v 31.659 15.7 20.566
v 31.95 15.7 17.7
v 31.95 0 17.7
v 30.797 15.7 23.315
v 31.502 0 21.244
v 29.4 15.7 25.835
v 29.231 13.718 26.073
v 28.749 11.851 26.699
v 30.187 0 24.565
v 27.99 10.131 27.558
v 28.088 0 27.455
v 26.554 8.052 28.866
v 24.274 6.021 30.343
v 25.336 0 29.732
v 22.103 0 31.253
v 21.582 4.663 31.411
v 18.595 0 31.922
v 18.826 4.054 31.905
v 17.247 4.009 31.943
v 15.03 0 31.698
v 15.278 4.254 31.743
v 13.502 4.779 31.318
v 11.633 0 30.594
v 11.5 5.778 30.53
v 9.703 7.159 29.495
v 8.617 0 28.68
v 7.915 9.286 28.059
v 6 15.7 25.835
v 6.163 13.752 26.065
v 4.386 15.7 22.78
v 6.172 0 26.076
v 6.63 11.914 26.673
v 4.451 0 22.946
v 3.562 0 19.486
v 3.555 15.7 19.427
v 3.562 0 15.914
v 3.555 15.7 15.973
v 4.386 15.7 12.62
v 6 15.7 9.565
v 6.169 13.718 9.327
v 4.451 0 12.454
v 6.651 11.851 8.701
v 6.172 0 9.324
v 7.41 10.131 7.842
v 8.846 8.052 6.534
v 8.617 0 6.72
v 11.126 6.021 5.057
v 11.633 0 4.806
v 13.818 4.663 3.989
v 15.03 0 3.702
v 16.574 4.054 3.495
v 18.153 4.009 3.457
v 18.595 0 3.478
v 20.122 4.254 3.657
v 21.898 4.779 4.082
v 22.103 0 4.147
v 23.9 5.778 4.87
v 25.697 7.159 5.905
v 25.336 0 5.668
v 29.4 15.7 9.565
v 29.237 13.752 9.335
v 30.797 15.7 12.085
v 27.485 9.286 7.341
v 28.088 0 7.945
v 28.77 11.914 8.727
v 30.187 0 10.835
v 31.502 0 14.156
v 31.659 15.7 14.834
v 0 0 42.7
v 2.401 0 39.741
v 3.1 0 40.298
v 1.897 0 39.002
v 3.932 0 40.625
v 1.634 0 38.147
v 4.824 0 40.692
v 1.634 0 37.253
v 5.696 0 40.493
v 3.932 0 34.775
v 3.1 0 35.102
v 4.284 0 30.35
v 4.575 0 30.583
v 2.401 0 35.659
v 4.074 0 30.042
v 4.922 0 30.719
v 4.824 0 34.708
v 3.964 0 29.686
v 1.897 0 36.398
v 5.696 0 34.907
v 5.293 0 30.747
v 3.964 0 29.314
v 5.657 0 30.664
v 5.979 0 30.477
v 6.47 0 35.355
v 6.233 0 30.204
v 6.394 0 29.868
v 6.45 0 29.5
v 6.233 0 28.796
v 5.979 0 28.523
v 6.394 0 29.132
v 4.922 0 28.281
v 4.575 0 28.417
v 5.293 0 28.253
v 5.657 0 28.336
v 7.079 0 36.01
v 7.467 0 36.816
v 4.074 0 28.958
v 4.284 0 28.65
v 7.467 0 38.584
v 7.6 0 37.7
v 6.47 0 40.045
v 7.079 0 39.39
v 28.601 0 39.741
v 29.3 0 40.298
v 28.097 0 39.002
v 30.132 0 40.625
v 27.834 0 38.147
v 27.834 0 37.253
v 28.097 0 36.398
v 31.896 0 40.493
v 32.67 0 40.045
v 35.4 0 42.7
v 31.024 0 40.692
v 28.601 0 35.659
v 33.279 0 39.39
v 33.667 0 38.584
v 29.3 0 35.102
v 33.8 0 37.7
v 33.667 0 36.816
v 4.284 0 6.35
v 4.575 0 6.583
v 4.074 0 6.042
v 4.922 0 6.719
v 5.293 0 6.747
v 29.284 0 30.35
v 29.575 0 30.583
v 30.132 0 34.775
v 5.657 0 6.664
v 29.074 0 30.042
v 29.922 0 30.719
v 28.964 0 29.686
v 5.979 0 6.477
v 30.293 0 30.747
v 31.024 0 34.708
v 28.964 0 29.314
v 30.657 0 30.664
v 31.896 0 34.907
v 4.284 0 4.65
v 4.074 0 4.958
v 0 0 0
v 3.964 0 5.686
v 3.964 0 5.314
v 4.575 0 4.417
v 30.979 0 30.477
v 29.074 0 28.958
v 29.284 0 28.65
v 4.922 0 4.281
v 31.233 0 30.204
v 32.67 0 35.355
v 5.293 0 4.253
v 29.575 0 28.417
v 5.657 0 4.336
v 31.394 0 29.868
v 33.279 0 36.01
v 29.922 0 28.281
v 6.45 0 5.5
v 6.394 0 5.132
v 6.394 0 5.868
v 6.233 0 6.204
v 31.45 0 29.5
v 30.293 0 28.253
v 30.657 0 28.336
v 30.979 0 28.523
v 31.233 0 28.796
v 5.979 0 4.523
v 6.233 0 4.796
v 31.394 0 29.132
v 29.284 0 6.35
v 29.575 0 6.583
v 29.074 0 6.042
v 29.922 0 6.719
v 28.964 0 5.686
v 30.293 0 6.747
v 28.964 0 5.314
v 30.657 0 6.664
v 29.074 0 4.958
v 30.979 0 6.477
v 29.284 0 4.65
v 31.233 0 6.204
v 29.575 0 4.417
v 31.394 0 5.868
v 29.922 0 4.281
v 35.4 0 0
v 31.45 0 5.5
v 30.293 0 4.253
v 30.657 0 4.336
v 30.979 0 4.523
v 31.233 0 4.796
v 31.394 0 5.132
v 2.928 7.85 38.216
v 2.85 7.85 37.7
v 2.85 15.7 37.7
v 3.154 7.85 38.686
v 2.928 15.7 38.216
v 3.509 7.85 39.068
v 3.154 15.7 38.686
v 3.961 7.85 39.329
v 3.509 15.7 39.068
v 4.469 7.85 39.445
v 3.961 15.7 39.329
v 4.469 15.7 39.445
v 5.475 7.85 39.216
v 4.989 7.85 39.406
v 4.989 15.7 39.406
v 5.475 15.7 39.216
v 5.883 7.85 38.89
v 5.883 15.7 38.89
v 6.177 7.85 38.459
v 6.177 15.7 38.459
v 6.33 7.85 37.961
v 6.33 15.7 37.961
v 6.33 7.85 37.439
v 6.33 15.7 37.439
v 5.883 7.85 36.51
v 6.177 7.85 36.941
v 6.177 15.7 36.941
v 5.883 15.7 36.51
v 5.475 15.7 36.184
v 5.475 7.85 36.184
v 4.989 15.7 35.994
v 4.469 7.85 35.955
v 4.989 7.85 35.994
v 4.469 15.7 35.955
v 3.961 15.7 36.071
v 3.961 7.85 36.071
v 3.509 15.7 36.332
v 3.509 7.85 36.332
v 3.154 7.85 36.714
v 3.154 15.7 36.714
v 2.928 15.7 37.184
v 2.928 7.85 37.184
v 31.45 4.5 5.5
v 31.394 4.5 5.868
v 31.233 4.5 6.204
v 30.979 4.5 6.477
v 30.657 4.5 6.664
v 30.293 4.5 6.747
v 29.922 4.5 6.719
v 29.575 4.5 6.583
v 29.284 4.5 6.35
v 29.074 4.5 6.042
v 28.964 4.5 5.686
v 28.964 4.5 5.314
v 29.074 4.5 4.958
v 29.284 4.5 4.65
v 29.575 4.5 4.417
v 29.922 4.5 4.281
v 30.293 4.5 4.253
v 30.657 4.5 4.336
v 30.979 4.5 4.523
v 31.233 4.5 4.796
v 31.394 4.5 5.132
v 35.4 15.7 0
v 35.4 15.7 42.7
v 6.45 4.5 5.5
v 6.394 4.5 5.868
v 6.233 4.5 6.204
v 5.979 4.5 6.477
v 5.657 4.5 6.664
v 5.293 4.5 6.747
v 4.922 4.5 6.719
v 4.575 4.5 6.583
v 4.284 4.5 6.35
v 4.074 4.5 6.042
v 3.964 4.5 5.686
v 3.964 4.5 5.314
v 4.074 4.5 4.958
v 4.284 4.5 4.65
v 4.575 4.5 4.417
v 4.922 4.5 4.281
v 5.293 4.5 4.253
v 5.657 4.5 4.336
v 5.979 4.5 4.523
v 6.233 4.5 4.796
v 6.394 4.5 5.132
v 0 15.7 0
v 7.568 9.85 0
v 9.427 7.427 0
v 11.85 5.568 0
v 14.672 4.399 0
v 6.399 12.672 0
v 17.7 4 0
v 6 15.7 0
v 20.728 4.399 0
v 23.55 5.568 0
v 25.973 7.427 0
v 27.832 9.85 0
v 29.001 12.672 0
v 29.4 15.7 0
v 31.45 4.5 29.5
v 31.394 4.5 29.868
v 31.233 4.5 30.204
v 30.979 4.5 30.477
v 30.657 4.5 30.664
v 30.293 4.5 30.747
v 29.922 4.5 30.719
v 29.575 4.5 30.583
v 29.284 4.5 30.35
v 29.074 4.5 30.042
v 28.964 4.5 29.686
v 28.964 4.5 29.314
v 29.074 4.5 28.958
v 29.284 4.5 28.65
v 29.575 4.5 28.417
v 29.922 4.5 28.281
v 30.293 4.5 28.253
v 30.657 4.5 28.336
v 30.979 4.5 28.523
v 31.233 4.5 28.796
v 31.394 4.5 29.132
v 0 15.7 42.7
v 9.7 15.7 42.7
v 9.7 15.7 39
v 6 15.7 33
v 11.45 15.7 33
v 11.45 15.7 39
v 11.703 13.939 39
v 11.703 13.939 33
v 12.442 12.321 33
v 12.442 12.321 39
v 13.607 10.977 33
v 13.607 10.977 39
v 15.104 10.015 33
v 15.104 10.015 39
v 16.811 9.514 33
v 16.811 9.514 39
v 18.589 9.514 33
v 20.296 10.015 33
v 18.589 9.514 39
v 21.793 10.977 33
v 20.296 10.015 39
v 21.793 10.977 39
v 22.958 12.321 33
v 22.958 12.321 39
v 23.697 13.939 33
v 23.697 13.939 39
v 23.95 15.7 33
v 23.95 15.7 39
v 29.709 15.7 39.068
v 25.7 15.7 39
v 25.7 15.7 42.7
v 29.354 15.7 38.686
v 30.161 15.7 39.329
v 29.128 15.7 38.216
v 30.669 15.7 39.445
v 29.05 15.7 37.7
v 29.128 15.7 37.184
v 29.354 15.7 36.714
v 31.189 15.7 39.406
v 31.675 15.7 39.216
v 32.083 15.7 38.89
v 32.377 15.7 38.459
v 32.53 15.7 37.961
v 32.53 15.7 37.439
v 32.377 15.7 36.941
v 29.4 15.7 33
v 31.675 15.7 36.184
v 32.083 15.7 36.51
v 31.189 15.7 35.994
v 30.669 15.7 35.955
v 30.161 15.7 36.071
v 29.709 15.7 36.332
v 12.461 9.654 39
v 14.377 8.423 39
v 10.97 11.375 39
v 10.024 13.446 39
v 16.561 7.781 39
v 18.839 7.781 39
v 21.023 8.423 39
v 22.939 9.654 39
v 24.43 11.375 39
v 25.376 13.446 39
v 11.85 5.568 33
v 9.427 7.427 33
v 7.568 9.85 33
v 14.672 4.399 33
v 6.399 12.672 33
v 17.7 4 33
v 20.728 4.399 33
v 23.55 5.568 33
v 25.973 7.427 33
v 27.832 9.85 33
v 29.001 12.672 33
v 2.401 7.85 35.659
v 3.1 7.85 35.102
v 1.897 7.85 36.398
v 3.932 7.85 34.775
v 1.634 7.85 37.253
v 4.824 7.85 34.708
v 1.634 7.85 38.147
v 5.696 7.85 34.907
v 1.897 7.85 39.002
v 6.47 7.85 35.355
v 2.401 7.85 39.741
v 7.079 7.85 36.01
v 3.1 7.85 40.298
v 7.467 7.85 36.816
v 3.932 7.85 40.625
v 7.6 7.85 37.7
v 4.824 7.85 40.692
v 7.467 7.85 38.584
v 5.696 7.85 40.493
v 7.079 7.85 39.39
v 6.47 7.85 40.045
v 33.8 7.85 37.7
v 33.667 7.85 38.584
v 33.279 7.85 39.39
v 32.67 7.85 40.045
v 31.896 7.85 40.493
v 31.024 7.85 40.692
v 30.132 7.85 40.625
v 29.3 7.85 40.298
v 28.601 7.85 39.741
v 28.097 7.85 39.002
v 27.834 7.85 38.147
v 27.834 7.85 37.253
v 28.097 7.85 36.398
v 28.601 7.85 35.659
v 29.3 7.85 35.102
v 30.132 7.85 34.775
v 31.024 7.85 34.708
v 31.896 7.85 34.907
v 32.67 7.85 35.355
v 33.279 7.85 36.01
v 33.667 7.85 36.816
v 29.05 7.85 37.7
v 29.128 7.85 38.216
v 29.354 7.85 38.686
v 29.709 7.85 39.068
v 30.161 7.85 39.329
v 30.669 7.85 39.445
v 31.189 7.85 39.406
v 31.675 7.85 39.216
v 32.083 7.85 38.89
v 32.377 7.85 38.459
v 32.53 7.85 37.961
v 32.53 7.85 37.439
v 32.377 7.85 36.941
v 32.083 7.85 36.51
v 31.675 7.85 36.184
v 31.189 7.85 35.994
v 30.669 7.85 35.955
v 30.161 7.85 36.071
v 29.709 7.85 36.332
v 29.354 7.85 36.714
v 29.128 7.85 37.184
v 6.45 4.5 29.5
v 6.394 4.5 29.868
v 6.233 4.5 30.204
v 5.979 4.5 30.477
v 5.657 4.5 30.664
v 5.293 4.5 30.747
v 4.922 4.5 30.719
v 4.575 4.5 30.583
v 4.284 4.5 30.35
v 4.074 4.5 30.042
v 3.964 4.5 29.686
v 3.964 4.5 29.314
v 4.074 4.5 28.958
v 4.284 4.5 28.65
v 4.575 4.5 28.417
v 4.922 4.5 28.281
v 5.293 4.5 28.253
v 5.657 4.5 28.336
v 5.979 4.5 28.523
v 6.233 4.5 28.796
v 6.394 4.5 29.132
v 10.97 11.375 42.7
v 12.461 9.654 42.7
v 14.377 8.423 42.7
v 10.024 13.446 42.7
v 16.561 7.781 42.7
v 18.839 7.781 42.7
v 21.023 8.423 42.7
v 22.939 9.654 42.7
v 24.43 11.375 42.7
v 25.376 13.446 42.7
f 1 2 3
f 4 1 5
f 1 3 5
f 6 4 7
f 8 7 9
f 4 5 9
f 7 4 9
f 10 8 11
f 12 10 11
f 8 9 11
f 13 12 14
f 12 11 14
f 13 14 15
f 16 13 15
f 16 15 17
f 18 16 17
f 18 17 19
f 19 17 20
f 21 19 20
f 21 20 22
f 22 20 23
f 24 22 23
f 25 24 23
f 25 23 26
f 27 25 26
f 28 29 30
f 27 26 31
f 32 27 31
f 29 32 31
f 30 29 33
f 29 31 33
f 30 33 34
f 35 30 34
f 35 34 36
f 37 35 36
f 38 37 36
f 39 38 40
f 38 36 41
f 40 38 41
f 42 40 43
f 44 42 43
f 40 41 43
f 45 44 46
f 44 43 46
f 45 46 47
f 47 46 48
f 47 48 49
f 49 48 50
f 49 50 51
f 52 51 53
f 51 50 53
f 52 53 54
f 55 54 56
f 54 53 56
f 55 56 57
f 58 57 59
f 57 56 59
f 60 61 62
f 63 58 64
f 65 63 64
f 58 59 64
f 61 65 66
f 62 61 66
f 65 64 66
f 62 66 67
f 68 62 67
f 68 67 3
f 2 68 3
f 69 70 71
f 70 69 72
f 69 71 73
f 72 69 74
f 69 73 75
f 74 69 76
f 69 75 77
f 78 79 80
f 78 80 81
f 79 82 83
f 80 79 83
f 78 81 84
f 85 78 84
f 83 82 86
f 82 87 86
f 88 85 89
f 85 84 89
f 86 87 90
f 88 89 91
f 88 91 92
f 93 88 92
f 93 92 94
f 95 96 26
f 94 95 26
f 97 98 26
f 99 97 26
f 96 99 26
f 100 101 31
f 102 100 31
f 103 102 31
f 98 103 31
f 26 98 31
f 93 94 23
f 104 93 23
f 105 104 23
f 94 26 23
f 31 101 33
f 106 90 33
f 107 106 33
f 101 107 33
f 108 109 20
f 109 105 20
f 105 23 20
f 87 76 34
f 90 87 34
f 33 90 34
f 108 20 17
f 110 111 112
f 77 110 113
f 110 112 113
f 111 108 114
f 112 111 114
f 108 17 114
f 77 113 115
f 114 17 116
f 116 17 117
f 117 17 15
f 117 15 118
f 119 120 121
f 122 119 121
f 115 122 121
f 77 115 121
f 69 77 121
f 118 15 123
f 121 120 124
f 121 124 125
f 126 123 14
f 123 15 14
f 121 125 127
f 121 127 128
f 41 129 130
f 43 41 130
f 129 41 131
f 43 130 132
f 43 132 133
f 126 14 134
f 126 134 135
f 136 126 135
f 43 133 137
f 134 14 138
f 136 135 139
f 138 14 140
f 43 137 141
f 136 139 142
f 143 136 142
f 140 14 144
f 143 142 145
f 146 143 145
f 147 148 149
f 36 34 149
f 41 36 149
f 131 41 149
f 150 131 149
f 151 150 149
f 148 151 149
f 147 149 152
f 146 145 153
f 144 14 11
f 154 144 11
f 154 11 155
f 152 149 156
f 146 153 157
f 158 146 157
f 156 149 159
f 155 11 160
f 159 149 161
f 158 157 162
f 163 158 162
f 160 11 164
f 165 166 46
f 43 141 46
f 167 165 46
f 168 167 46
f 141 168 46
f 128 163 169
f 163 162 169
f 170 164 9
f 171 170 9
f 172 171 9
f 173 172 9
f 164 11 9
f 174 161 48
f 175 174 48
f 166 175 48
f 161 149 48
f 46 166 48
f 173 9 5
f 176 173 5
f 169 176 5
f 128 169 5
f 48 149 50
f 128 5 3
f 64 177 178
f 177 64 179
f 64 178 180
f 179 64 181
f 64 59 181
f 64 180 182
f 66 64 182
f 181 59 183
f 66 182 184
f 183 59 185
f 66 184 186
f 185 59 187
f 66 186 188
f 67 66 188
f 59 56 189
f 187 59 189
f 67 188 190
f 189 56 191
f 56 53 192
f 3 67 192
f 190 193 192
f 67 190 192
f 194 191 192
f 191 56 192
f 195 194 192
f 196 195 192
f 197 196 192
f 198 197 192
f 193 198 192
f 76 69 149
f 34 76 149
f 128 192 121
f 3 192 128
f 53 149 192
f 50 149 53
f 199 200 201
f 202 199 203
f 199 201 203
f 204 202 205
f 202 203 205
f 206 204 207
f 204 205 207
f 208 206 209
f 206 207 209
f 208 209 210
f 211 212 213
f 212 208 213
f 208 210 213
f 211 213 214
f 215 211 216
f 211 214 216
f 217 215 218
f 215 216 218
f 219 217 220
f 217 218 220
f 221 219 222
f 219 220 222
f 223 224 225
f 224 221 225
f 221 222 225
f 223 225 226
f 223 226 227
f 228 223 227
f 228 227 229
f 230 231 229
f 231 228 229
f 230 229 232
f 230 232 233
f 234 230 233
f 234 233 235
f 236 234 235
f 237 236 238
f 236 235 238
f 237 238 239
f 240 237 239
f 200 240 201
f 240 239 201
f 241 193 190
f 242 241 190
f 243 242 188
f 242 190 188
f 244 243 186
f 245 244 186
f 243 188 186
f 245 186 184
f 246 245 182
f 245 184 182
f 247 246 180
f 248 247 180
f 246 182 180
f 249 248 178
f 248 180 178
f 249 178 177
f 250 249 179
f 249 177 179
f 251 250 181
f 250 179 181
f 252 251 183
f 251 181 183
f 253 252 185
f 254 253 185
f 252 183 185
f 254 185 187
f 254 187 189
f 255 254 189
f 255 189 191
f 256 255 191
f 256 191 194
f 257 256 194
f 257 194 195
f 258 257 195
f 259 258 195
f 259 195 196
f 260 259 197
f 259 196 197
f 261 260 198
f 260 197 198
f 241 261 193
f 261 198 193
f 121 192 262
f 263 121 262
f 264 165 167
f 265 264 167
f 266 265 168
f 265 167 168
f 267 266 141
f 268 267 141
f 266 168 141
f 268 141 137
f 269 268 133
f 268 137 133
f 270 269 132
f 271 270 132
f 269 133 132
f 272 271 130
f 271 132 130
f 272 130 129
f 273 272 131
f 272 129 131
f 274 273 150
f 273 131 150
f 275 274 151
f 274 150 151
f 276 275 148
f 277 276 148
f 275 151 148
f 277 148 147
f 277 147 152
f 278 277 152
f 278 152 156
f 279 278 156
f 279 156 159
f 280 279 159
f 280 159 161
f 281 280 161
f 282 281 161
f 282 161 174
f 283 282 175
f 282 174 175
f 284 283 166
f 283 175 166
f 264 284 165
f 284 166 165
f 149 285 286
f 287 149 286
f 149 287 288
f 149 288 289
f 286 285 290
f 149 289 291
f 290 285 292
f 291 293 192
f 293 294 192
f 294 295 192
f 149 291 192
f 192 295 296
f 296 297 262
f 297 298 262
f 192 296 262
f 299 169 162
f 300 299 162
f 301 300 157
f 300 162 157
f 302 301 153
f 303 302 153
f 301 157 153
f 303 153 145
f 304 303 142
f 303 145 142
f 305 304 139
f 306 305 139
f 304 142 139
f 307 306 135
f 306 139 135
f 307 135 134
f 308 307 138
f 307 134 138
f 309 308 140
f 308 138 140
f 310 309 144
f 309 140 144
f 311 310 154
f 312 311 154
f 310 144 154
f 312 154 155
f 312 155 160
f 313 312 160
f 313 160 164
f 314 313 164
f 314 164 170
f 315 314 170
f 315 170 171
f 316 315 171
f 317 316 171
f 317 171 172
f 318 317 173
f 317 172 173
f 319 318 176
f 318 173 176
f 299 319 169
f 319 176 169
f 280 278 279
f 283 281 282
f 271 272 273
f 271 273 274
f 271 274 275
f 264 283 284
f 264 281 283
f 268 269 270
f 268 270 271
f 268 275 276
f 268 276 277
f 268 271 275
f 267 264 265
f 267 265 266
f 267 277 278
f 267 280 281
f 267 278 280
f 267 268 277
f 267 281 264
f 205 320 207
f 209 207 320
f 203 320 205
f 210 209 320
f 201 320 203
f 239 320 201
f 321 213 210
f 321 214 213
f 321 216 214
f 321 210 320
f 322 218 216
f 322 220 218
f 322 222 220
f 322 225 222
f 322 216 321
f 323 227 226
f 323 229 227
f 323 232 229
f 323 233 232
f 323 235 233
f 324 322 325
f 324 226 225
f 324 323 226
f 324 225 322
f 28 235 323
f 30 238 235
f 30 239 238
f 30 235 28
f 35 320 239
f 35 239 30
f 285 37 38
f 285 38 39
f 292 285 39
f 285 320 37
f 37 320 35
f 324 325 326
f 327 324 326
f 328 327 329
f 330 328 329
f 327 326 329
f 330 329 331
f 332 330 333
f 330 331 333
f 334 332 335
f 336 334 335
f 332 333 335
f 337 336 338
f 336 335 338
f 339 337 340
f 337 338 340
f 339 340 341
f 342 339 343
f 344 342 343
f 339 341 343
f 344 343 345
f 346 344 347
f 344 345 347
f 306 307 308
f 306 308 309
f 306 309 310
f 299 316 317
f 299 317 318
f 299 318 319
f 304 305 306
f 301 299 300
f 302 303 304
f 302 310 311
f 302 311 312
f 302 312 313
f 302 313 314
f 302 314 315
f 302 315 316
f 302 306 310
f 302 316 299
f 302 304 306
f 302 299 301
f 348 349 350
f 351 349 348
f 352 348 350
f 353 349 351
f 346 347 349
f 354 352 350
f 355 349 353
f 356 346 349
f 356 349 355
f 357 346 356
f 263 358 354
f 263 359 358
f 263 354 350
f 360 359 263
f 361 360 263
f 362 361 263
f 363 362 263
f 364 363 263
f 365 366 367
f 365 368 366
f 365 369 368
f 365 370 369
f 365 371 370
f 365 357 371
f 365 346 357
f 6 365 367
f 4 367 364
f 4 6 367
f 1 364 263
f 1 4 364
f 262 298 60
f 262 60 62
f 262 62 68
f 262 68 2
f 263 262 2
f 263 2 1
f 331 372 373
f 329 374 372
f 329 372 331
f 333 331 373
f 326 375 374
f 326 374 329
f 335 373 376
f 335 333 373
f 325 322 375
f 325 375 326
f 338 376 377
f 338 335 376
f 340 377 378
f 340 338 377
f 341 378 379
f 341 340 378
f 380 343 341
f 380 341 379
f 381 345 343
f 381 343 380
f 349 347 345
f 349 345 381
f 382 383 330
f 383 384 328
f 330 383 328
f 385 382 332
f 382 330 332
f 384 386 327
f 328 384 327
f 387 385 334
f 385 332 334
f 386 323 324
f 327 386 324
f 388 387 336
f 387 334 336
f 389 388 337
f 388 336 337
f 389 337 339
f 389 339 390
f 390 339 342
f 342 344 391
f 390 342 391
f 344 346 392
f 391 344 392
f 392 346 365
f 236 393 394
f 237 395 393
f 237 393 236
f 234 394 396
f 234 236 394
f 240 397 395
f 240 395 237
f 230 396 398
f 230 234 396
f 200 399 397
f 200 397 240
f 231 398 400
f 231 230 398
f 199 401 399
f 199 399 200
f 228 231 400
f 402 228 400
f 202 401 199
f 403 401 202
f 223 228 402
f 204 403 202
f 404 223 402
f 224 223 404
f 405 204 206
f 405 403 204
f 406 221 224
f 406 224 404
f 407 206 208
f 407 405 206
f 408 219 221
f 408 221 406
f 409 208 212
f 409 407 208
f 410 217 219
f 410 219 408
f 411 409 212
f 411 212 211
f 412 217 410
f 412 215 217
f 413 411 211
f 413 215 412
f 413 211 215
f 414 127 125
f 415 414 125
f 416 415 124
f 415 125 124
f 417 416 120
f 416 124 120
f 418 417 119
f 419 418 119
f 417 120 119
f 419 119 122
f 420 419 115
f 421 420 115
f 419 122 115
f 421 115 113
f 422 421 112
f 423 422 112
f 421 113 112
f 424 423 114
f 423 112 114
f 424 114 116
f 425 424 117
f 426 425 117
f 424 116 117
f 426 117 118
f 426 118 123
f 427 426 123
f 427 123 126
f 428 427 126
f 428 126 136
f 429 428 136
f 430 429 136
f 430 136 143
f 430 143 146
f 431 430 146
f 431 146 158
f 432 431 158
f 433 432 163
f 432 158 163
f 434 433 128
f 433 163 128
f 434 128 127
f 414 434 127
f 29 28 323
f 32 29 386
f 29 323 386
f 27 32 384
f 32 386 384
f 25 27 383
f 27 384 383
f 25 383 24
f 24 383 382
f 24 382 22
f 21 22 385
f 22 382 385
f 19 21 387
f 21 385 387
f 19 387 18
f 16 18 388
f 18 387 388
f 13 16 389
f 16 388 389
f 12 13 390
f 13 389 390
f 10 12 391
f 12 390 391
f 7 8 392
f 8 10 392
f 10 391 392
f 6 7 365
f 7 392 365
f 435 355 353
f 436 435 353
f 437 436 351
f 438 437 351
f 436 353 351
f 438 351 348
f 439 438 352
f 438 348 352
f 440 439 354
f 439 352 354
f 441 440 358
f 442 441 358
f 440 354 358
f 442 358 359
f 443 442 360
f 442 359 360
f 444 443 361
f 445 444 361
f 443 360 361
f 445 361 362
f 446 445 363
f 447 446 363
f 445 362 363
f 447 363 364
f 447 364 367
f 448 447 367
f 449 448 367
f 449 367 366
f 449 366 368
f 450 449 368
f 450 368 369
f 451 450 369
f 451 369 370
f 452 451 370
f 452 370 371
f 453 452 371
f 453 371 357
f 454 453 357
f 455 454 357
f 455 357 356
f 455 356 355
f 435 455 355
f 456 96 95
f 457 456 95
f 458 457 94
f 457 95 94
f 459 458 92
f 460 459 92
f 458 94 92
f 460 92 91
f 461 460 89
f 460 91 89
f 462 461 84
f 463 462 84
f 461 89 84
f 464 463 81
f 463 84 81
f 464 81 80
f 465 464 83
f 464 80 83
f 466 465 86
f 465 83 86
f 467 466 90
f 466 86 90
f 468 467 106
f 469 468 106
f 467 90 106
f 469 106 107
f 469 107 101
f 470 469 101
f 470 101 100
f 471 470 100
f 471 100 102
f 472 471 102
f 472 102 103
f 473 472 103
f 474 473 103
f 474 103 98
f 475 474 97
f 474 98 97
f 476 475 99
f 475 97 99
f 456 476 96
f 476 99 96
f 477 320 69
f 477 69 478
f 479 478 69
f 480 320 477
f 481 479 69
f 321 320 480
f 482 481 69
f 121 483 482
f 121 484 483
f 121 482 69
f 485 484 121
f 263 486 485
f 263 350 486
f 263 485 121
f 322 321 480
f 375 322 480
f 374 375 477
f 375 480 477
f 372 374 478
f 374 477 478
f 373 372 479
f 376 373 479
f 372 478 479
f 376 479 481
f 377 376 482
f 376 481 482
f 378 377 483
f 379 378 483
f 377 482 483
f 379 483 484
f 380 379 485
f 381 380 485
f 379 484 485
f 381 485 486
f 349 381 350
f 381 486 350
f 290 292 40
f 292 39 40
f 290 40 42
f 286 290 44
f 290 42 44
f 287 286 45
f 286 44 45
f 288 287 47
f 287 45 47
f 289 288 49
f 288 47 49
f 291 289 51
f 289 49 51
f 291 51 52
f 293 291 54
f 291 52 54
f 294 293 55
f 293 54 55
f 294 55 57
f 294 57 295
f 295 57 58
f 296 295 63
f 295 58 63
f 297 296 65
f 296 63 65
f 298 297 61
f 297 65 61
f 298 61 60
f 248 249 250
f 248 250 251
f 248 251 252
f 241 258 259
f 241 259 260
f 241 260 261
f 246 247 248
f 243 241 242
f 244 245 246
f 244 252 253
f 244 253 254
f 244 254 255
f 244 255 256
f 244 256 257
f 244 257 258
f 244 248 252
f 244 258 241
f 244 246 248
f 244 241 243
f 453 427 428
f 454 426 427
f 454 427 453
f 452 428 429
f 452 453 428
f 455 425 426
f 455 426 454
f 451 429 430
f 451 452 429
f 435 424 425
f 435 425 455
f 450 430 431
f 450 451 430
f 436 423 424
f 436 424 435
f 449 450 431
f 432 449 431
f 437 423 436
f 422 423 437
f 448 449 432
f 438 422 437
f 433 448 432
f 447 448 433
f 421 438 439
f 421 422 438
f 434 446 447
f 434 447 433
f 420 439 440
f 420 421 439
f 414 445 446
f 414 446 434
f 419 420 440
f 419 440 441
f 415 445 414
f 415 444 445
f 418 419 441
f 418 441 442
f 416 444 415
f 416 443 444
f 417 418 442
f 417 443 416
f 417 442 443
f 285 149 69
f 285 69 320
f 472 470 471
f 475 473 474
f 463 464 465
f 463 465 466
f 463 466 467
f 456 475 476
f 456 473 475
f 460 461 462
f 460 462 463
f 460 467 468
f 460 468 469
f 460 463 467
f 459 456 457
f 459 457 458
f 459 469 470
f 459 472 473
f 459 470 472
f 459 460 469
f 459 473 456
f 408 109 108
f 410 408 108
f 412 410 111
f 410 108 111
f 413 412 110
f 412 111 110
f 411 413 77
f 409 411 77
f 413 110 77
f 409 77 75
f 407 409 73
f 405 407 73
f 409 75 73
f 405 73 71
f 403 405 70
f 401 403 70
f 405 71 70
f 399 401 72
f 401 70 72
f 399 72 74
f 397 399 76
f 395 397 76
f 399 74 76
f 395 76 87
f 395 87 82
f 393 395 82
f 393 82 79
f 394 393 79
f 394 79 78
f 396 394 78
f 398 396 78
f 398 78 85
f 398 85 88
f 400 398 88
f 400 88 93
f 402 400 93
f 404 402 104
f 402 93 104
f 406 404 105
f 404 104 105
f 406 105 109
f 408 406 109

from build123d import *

# Parameters (mm, degrees)
F0_W      = 35.4
F0_H      = 15.7
F1_DEPTH  = 42.7
F3_DEPTH  = 3.7
F5_DEPTH  = 6
F6_R      = 11.7
F7_DEPTH  = 35
F8_R      = 14.25
F9_DEPTH  = 25
F10_R     = 1.25
F11_DEPTH = 4.5
F12_R     = 1.75
F13_DEPTH = 25
F14_R     = 3
F14_R_2   = 1.75
F15_DEPTH = 7.85


with BuildPart() as f1:
    # F0 (on Top) → F1 (new body)
    with BuildSketch(Plane.XY):
        with Locations((17.7, 7.85)):
            Rectangle(F0_W, F0_H)
    extrude(amount=F1_DEPTH)

    # F2 (on face) → F3 (cut)
    with BuildSketch(Plane.XY.offset(42.7)):
        with BuildLine():
            ThreePointArc((9.7, 15.7), (17.7, 7.7), (25.7, 15.7))
            Line((25.7, 15.7), (9.7, 15.7))
        make_face()
    extrude(amount=-F3_DEPTH, mode=Mode.SUBTRACT)

    # F4 (on face) → F5 (cut)
    with BuildSketch(Plane.XY.offset(39)):
        with BuildLine():
            ThreePointArc((11.45, 15.7), (17.7, 9.45), (23.95, 15.7))
            Line((23.95, 15.7), (11.45, 15.7))
        make_face()
    extrude(amount=-F5_DEPTH, mode=Mode.SUBTRACT)

    # F6 (on face) → F7 (cut)
    with BuildSketch(Plane.XY.offset(33)):
        with Locations((17.7, 15.7)):
            Circle(F6_R)
        with BuildLine():
            Line((11.45, 15.7), (23.95, 15.7))
            ThreePointArc((23.95, 15.7), (17.7, 9.45), (11.45, 15.7))
        make_face(mode=Mode.SUBTRACT)
        with BuildLine():
            ThreePointArc((11.45, 15.7), (17.7, 9.45), (23.95, 15.7))
            Line((23.95, 15.7), (11.45, 15.7))
        make_face()
    extrude(amount=-F7_DEPTH, mode=Mode.SUBTRACT)

    # F8 (on face) → F9 (cut)
    with BuildSketch(Plane.XZ):
        with Locations((17.7, 17.7)):
            Circle(F8_R)
    extrude(amount=-F9_DEPTH, mode=Mode.SUBTRACT)

    # F10 (on face) → F11 (cut)
    with BuildSketch(Plane.XZ):
        with Locations((5.2, 5.5)):
            Circle(F10_R)
        with Locations((5.2, 29.5)):
            Circle(F10_R)
        with Locations((30.2, 29.5)):
            Circle(F10_R)
        with Locations((30.2, 5.5)):
            Circle(F10_R)
    extrude(amount=-F11_DEPTH, mode=Mode.SUBTRACT)

    # F12 (on face) → F13 (cut)
    with BuildSketch(Plane(origin=(0, 15.7, 0), x_dir=(-1, 0, 0), z_dir=(0, 1, 0))):
        with Locations((-4.6, 37.7)):
            Circle(F12_R)
        with Locations((-30.8, 37.7)):
            Circle(F12_R)
    extrude(amount=-F13_DEPTH, mode=Mode.SUBTRACT)

    # F14 (on face) → F15 (cut)
    with BuildSketch(Plane.XZ):
        with Locations((4.6, 37.7)):
            Circle(F14_R)
        with Locations((4.6, 37.7)):
            Circle(F14_R_2, mode=Mode.SUBTRACT)
        with Locations((30.8, 37.7)):
            Circle(F14_R)
        with Locations((30.8, 37.7)):
            Circle(F14_R_2, mode=Mode.SUBTRACT)
    extrude(amount=-F15_DEPTH, mode=Mode.SUBTRACT)


solid = f1.part
